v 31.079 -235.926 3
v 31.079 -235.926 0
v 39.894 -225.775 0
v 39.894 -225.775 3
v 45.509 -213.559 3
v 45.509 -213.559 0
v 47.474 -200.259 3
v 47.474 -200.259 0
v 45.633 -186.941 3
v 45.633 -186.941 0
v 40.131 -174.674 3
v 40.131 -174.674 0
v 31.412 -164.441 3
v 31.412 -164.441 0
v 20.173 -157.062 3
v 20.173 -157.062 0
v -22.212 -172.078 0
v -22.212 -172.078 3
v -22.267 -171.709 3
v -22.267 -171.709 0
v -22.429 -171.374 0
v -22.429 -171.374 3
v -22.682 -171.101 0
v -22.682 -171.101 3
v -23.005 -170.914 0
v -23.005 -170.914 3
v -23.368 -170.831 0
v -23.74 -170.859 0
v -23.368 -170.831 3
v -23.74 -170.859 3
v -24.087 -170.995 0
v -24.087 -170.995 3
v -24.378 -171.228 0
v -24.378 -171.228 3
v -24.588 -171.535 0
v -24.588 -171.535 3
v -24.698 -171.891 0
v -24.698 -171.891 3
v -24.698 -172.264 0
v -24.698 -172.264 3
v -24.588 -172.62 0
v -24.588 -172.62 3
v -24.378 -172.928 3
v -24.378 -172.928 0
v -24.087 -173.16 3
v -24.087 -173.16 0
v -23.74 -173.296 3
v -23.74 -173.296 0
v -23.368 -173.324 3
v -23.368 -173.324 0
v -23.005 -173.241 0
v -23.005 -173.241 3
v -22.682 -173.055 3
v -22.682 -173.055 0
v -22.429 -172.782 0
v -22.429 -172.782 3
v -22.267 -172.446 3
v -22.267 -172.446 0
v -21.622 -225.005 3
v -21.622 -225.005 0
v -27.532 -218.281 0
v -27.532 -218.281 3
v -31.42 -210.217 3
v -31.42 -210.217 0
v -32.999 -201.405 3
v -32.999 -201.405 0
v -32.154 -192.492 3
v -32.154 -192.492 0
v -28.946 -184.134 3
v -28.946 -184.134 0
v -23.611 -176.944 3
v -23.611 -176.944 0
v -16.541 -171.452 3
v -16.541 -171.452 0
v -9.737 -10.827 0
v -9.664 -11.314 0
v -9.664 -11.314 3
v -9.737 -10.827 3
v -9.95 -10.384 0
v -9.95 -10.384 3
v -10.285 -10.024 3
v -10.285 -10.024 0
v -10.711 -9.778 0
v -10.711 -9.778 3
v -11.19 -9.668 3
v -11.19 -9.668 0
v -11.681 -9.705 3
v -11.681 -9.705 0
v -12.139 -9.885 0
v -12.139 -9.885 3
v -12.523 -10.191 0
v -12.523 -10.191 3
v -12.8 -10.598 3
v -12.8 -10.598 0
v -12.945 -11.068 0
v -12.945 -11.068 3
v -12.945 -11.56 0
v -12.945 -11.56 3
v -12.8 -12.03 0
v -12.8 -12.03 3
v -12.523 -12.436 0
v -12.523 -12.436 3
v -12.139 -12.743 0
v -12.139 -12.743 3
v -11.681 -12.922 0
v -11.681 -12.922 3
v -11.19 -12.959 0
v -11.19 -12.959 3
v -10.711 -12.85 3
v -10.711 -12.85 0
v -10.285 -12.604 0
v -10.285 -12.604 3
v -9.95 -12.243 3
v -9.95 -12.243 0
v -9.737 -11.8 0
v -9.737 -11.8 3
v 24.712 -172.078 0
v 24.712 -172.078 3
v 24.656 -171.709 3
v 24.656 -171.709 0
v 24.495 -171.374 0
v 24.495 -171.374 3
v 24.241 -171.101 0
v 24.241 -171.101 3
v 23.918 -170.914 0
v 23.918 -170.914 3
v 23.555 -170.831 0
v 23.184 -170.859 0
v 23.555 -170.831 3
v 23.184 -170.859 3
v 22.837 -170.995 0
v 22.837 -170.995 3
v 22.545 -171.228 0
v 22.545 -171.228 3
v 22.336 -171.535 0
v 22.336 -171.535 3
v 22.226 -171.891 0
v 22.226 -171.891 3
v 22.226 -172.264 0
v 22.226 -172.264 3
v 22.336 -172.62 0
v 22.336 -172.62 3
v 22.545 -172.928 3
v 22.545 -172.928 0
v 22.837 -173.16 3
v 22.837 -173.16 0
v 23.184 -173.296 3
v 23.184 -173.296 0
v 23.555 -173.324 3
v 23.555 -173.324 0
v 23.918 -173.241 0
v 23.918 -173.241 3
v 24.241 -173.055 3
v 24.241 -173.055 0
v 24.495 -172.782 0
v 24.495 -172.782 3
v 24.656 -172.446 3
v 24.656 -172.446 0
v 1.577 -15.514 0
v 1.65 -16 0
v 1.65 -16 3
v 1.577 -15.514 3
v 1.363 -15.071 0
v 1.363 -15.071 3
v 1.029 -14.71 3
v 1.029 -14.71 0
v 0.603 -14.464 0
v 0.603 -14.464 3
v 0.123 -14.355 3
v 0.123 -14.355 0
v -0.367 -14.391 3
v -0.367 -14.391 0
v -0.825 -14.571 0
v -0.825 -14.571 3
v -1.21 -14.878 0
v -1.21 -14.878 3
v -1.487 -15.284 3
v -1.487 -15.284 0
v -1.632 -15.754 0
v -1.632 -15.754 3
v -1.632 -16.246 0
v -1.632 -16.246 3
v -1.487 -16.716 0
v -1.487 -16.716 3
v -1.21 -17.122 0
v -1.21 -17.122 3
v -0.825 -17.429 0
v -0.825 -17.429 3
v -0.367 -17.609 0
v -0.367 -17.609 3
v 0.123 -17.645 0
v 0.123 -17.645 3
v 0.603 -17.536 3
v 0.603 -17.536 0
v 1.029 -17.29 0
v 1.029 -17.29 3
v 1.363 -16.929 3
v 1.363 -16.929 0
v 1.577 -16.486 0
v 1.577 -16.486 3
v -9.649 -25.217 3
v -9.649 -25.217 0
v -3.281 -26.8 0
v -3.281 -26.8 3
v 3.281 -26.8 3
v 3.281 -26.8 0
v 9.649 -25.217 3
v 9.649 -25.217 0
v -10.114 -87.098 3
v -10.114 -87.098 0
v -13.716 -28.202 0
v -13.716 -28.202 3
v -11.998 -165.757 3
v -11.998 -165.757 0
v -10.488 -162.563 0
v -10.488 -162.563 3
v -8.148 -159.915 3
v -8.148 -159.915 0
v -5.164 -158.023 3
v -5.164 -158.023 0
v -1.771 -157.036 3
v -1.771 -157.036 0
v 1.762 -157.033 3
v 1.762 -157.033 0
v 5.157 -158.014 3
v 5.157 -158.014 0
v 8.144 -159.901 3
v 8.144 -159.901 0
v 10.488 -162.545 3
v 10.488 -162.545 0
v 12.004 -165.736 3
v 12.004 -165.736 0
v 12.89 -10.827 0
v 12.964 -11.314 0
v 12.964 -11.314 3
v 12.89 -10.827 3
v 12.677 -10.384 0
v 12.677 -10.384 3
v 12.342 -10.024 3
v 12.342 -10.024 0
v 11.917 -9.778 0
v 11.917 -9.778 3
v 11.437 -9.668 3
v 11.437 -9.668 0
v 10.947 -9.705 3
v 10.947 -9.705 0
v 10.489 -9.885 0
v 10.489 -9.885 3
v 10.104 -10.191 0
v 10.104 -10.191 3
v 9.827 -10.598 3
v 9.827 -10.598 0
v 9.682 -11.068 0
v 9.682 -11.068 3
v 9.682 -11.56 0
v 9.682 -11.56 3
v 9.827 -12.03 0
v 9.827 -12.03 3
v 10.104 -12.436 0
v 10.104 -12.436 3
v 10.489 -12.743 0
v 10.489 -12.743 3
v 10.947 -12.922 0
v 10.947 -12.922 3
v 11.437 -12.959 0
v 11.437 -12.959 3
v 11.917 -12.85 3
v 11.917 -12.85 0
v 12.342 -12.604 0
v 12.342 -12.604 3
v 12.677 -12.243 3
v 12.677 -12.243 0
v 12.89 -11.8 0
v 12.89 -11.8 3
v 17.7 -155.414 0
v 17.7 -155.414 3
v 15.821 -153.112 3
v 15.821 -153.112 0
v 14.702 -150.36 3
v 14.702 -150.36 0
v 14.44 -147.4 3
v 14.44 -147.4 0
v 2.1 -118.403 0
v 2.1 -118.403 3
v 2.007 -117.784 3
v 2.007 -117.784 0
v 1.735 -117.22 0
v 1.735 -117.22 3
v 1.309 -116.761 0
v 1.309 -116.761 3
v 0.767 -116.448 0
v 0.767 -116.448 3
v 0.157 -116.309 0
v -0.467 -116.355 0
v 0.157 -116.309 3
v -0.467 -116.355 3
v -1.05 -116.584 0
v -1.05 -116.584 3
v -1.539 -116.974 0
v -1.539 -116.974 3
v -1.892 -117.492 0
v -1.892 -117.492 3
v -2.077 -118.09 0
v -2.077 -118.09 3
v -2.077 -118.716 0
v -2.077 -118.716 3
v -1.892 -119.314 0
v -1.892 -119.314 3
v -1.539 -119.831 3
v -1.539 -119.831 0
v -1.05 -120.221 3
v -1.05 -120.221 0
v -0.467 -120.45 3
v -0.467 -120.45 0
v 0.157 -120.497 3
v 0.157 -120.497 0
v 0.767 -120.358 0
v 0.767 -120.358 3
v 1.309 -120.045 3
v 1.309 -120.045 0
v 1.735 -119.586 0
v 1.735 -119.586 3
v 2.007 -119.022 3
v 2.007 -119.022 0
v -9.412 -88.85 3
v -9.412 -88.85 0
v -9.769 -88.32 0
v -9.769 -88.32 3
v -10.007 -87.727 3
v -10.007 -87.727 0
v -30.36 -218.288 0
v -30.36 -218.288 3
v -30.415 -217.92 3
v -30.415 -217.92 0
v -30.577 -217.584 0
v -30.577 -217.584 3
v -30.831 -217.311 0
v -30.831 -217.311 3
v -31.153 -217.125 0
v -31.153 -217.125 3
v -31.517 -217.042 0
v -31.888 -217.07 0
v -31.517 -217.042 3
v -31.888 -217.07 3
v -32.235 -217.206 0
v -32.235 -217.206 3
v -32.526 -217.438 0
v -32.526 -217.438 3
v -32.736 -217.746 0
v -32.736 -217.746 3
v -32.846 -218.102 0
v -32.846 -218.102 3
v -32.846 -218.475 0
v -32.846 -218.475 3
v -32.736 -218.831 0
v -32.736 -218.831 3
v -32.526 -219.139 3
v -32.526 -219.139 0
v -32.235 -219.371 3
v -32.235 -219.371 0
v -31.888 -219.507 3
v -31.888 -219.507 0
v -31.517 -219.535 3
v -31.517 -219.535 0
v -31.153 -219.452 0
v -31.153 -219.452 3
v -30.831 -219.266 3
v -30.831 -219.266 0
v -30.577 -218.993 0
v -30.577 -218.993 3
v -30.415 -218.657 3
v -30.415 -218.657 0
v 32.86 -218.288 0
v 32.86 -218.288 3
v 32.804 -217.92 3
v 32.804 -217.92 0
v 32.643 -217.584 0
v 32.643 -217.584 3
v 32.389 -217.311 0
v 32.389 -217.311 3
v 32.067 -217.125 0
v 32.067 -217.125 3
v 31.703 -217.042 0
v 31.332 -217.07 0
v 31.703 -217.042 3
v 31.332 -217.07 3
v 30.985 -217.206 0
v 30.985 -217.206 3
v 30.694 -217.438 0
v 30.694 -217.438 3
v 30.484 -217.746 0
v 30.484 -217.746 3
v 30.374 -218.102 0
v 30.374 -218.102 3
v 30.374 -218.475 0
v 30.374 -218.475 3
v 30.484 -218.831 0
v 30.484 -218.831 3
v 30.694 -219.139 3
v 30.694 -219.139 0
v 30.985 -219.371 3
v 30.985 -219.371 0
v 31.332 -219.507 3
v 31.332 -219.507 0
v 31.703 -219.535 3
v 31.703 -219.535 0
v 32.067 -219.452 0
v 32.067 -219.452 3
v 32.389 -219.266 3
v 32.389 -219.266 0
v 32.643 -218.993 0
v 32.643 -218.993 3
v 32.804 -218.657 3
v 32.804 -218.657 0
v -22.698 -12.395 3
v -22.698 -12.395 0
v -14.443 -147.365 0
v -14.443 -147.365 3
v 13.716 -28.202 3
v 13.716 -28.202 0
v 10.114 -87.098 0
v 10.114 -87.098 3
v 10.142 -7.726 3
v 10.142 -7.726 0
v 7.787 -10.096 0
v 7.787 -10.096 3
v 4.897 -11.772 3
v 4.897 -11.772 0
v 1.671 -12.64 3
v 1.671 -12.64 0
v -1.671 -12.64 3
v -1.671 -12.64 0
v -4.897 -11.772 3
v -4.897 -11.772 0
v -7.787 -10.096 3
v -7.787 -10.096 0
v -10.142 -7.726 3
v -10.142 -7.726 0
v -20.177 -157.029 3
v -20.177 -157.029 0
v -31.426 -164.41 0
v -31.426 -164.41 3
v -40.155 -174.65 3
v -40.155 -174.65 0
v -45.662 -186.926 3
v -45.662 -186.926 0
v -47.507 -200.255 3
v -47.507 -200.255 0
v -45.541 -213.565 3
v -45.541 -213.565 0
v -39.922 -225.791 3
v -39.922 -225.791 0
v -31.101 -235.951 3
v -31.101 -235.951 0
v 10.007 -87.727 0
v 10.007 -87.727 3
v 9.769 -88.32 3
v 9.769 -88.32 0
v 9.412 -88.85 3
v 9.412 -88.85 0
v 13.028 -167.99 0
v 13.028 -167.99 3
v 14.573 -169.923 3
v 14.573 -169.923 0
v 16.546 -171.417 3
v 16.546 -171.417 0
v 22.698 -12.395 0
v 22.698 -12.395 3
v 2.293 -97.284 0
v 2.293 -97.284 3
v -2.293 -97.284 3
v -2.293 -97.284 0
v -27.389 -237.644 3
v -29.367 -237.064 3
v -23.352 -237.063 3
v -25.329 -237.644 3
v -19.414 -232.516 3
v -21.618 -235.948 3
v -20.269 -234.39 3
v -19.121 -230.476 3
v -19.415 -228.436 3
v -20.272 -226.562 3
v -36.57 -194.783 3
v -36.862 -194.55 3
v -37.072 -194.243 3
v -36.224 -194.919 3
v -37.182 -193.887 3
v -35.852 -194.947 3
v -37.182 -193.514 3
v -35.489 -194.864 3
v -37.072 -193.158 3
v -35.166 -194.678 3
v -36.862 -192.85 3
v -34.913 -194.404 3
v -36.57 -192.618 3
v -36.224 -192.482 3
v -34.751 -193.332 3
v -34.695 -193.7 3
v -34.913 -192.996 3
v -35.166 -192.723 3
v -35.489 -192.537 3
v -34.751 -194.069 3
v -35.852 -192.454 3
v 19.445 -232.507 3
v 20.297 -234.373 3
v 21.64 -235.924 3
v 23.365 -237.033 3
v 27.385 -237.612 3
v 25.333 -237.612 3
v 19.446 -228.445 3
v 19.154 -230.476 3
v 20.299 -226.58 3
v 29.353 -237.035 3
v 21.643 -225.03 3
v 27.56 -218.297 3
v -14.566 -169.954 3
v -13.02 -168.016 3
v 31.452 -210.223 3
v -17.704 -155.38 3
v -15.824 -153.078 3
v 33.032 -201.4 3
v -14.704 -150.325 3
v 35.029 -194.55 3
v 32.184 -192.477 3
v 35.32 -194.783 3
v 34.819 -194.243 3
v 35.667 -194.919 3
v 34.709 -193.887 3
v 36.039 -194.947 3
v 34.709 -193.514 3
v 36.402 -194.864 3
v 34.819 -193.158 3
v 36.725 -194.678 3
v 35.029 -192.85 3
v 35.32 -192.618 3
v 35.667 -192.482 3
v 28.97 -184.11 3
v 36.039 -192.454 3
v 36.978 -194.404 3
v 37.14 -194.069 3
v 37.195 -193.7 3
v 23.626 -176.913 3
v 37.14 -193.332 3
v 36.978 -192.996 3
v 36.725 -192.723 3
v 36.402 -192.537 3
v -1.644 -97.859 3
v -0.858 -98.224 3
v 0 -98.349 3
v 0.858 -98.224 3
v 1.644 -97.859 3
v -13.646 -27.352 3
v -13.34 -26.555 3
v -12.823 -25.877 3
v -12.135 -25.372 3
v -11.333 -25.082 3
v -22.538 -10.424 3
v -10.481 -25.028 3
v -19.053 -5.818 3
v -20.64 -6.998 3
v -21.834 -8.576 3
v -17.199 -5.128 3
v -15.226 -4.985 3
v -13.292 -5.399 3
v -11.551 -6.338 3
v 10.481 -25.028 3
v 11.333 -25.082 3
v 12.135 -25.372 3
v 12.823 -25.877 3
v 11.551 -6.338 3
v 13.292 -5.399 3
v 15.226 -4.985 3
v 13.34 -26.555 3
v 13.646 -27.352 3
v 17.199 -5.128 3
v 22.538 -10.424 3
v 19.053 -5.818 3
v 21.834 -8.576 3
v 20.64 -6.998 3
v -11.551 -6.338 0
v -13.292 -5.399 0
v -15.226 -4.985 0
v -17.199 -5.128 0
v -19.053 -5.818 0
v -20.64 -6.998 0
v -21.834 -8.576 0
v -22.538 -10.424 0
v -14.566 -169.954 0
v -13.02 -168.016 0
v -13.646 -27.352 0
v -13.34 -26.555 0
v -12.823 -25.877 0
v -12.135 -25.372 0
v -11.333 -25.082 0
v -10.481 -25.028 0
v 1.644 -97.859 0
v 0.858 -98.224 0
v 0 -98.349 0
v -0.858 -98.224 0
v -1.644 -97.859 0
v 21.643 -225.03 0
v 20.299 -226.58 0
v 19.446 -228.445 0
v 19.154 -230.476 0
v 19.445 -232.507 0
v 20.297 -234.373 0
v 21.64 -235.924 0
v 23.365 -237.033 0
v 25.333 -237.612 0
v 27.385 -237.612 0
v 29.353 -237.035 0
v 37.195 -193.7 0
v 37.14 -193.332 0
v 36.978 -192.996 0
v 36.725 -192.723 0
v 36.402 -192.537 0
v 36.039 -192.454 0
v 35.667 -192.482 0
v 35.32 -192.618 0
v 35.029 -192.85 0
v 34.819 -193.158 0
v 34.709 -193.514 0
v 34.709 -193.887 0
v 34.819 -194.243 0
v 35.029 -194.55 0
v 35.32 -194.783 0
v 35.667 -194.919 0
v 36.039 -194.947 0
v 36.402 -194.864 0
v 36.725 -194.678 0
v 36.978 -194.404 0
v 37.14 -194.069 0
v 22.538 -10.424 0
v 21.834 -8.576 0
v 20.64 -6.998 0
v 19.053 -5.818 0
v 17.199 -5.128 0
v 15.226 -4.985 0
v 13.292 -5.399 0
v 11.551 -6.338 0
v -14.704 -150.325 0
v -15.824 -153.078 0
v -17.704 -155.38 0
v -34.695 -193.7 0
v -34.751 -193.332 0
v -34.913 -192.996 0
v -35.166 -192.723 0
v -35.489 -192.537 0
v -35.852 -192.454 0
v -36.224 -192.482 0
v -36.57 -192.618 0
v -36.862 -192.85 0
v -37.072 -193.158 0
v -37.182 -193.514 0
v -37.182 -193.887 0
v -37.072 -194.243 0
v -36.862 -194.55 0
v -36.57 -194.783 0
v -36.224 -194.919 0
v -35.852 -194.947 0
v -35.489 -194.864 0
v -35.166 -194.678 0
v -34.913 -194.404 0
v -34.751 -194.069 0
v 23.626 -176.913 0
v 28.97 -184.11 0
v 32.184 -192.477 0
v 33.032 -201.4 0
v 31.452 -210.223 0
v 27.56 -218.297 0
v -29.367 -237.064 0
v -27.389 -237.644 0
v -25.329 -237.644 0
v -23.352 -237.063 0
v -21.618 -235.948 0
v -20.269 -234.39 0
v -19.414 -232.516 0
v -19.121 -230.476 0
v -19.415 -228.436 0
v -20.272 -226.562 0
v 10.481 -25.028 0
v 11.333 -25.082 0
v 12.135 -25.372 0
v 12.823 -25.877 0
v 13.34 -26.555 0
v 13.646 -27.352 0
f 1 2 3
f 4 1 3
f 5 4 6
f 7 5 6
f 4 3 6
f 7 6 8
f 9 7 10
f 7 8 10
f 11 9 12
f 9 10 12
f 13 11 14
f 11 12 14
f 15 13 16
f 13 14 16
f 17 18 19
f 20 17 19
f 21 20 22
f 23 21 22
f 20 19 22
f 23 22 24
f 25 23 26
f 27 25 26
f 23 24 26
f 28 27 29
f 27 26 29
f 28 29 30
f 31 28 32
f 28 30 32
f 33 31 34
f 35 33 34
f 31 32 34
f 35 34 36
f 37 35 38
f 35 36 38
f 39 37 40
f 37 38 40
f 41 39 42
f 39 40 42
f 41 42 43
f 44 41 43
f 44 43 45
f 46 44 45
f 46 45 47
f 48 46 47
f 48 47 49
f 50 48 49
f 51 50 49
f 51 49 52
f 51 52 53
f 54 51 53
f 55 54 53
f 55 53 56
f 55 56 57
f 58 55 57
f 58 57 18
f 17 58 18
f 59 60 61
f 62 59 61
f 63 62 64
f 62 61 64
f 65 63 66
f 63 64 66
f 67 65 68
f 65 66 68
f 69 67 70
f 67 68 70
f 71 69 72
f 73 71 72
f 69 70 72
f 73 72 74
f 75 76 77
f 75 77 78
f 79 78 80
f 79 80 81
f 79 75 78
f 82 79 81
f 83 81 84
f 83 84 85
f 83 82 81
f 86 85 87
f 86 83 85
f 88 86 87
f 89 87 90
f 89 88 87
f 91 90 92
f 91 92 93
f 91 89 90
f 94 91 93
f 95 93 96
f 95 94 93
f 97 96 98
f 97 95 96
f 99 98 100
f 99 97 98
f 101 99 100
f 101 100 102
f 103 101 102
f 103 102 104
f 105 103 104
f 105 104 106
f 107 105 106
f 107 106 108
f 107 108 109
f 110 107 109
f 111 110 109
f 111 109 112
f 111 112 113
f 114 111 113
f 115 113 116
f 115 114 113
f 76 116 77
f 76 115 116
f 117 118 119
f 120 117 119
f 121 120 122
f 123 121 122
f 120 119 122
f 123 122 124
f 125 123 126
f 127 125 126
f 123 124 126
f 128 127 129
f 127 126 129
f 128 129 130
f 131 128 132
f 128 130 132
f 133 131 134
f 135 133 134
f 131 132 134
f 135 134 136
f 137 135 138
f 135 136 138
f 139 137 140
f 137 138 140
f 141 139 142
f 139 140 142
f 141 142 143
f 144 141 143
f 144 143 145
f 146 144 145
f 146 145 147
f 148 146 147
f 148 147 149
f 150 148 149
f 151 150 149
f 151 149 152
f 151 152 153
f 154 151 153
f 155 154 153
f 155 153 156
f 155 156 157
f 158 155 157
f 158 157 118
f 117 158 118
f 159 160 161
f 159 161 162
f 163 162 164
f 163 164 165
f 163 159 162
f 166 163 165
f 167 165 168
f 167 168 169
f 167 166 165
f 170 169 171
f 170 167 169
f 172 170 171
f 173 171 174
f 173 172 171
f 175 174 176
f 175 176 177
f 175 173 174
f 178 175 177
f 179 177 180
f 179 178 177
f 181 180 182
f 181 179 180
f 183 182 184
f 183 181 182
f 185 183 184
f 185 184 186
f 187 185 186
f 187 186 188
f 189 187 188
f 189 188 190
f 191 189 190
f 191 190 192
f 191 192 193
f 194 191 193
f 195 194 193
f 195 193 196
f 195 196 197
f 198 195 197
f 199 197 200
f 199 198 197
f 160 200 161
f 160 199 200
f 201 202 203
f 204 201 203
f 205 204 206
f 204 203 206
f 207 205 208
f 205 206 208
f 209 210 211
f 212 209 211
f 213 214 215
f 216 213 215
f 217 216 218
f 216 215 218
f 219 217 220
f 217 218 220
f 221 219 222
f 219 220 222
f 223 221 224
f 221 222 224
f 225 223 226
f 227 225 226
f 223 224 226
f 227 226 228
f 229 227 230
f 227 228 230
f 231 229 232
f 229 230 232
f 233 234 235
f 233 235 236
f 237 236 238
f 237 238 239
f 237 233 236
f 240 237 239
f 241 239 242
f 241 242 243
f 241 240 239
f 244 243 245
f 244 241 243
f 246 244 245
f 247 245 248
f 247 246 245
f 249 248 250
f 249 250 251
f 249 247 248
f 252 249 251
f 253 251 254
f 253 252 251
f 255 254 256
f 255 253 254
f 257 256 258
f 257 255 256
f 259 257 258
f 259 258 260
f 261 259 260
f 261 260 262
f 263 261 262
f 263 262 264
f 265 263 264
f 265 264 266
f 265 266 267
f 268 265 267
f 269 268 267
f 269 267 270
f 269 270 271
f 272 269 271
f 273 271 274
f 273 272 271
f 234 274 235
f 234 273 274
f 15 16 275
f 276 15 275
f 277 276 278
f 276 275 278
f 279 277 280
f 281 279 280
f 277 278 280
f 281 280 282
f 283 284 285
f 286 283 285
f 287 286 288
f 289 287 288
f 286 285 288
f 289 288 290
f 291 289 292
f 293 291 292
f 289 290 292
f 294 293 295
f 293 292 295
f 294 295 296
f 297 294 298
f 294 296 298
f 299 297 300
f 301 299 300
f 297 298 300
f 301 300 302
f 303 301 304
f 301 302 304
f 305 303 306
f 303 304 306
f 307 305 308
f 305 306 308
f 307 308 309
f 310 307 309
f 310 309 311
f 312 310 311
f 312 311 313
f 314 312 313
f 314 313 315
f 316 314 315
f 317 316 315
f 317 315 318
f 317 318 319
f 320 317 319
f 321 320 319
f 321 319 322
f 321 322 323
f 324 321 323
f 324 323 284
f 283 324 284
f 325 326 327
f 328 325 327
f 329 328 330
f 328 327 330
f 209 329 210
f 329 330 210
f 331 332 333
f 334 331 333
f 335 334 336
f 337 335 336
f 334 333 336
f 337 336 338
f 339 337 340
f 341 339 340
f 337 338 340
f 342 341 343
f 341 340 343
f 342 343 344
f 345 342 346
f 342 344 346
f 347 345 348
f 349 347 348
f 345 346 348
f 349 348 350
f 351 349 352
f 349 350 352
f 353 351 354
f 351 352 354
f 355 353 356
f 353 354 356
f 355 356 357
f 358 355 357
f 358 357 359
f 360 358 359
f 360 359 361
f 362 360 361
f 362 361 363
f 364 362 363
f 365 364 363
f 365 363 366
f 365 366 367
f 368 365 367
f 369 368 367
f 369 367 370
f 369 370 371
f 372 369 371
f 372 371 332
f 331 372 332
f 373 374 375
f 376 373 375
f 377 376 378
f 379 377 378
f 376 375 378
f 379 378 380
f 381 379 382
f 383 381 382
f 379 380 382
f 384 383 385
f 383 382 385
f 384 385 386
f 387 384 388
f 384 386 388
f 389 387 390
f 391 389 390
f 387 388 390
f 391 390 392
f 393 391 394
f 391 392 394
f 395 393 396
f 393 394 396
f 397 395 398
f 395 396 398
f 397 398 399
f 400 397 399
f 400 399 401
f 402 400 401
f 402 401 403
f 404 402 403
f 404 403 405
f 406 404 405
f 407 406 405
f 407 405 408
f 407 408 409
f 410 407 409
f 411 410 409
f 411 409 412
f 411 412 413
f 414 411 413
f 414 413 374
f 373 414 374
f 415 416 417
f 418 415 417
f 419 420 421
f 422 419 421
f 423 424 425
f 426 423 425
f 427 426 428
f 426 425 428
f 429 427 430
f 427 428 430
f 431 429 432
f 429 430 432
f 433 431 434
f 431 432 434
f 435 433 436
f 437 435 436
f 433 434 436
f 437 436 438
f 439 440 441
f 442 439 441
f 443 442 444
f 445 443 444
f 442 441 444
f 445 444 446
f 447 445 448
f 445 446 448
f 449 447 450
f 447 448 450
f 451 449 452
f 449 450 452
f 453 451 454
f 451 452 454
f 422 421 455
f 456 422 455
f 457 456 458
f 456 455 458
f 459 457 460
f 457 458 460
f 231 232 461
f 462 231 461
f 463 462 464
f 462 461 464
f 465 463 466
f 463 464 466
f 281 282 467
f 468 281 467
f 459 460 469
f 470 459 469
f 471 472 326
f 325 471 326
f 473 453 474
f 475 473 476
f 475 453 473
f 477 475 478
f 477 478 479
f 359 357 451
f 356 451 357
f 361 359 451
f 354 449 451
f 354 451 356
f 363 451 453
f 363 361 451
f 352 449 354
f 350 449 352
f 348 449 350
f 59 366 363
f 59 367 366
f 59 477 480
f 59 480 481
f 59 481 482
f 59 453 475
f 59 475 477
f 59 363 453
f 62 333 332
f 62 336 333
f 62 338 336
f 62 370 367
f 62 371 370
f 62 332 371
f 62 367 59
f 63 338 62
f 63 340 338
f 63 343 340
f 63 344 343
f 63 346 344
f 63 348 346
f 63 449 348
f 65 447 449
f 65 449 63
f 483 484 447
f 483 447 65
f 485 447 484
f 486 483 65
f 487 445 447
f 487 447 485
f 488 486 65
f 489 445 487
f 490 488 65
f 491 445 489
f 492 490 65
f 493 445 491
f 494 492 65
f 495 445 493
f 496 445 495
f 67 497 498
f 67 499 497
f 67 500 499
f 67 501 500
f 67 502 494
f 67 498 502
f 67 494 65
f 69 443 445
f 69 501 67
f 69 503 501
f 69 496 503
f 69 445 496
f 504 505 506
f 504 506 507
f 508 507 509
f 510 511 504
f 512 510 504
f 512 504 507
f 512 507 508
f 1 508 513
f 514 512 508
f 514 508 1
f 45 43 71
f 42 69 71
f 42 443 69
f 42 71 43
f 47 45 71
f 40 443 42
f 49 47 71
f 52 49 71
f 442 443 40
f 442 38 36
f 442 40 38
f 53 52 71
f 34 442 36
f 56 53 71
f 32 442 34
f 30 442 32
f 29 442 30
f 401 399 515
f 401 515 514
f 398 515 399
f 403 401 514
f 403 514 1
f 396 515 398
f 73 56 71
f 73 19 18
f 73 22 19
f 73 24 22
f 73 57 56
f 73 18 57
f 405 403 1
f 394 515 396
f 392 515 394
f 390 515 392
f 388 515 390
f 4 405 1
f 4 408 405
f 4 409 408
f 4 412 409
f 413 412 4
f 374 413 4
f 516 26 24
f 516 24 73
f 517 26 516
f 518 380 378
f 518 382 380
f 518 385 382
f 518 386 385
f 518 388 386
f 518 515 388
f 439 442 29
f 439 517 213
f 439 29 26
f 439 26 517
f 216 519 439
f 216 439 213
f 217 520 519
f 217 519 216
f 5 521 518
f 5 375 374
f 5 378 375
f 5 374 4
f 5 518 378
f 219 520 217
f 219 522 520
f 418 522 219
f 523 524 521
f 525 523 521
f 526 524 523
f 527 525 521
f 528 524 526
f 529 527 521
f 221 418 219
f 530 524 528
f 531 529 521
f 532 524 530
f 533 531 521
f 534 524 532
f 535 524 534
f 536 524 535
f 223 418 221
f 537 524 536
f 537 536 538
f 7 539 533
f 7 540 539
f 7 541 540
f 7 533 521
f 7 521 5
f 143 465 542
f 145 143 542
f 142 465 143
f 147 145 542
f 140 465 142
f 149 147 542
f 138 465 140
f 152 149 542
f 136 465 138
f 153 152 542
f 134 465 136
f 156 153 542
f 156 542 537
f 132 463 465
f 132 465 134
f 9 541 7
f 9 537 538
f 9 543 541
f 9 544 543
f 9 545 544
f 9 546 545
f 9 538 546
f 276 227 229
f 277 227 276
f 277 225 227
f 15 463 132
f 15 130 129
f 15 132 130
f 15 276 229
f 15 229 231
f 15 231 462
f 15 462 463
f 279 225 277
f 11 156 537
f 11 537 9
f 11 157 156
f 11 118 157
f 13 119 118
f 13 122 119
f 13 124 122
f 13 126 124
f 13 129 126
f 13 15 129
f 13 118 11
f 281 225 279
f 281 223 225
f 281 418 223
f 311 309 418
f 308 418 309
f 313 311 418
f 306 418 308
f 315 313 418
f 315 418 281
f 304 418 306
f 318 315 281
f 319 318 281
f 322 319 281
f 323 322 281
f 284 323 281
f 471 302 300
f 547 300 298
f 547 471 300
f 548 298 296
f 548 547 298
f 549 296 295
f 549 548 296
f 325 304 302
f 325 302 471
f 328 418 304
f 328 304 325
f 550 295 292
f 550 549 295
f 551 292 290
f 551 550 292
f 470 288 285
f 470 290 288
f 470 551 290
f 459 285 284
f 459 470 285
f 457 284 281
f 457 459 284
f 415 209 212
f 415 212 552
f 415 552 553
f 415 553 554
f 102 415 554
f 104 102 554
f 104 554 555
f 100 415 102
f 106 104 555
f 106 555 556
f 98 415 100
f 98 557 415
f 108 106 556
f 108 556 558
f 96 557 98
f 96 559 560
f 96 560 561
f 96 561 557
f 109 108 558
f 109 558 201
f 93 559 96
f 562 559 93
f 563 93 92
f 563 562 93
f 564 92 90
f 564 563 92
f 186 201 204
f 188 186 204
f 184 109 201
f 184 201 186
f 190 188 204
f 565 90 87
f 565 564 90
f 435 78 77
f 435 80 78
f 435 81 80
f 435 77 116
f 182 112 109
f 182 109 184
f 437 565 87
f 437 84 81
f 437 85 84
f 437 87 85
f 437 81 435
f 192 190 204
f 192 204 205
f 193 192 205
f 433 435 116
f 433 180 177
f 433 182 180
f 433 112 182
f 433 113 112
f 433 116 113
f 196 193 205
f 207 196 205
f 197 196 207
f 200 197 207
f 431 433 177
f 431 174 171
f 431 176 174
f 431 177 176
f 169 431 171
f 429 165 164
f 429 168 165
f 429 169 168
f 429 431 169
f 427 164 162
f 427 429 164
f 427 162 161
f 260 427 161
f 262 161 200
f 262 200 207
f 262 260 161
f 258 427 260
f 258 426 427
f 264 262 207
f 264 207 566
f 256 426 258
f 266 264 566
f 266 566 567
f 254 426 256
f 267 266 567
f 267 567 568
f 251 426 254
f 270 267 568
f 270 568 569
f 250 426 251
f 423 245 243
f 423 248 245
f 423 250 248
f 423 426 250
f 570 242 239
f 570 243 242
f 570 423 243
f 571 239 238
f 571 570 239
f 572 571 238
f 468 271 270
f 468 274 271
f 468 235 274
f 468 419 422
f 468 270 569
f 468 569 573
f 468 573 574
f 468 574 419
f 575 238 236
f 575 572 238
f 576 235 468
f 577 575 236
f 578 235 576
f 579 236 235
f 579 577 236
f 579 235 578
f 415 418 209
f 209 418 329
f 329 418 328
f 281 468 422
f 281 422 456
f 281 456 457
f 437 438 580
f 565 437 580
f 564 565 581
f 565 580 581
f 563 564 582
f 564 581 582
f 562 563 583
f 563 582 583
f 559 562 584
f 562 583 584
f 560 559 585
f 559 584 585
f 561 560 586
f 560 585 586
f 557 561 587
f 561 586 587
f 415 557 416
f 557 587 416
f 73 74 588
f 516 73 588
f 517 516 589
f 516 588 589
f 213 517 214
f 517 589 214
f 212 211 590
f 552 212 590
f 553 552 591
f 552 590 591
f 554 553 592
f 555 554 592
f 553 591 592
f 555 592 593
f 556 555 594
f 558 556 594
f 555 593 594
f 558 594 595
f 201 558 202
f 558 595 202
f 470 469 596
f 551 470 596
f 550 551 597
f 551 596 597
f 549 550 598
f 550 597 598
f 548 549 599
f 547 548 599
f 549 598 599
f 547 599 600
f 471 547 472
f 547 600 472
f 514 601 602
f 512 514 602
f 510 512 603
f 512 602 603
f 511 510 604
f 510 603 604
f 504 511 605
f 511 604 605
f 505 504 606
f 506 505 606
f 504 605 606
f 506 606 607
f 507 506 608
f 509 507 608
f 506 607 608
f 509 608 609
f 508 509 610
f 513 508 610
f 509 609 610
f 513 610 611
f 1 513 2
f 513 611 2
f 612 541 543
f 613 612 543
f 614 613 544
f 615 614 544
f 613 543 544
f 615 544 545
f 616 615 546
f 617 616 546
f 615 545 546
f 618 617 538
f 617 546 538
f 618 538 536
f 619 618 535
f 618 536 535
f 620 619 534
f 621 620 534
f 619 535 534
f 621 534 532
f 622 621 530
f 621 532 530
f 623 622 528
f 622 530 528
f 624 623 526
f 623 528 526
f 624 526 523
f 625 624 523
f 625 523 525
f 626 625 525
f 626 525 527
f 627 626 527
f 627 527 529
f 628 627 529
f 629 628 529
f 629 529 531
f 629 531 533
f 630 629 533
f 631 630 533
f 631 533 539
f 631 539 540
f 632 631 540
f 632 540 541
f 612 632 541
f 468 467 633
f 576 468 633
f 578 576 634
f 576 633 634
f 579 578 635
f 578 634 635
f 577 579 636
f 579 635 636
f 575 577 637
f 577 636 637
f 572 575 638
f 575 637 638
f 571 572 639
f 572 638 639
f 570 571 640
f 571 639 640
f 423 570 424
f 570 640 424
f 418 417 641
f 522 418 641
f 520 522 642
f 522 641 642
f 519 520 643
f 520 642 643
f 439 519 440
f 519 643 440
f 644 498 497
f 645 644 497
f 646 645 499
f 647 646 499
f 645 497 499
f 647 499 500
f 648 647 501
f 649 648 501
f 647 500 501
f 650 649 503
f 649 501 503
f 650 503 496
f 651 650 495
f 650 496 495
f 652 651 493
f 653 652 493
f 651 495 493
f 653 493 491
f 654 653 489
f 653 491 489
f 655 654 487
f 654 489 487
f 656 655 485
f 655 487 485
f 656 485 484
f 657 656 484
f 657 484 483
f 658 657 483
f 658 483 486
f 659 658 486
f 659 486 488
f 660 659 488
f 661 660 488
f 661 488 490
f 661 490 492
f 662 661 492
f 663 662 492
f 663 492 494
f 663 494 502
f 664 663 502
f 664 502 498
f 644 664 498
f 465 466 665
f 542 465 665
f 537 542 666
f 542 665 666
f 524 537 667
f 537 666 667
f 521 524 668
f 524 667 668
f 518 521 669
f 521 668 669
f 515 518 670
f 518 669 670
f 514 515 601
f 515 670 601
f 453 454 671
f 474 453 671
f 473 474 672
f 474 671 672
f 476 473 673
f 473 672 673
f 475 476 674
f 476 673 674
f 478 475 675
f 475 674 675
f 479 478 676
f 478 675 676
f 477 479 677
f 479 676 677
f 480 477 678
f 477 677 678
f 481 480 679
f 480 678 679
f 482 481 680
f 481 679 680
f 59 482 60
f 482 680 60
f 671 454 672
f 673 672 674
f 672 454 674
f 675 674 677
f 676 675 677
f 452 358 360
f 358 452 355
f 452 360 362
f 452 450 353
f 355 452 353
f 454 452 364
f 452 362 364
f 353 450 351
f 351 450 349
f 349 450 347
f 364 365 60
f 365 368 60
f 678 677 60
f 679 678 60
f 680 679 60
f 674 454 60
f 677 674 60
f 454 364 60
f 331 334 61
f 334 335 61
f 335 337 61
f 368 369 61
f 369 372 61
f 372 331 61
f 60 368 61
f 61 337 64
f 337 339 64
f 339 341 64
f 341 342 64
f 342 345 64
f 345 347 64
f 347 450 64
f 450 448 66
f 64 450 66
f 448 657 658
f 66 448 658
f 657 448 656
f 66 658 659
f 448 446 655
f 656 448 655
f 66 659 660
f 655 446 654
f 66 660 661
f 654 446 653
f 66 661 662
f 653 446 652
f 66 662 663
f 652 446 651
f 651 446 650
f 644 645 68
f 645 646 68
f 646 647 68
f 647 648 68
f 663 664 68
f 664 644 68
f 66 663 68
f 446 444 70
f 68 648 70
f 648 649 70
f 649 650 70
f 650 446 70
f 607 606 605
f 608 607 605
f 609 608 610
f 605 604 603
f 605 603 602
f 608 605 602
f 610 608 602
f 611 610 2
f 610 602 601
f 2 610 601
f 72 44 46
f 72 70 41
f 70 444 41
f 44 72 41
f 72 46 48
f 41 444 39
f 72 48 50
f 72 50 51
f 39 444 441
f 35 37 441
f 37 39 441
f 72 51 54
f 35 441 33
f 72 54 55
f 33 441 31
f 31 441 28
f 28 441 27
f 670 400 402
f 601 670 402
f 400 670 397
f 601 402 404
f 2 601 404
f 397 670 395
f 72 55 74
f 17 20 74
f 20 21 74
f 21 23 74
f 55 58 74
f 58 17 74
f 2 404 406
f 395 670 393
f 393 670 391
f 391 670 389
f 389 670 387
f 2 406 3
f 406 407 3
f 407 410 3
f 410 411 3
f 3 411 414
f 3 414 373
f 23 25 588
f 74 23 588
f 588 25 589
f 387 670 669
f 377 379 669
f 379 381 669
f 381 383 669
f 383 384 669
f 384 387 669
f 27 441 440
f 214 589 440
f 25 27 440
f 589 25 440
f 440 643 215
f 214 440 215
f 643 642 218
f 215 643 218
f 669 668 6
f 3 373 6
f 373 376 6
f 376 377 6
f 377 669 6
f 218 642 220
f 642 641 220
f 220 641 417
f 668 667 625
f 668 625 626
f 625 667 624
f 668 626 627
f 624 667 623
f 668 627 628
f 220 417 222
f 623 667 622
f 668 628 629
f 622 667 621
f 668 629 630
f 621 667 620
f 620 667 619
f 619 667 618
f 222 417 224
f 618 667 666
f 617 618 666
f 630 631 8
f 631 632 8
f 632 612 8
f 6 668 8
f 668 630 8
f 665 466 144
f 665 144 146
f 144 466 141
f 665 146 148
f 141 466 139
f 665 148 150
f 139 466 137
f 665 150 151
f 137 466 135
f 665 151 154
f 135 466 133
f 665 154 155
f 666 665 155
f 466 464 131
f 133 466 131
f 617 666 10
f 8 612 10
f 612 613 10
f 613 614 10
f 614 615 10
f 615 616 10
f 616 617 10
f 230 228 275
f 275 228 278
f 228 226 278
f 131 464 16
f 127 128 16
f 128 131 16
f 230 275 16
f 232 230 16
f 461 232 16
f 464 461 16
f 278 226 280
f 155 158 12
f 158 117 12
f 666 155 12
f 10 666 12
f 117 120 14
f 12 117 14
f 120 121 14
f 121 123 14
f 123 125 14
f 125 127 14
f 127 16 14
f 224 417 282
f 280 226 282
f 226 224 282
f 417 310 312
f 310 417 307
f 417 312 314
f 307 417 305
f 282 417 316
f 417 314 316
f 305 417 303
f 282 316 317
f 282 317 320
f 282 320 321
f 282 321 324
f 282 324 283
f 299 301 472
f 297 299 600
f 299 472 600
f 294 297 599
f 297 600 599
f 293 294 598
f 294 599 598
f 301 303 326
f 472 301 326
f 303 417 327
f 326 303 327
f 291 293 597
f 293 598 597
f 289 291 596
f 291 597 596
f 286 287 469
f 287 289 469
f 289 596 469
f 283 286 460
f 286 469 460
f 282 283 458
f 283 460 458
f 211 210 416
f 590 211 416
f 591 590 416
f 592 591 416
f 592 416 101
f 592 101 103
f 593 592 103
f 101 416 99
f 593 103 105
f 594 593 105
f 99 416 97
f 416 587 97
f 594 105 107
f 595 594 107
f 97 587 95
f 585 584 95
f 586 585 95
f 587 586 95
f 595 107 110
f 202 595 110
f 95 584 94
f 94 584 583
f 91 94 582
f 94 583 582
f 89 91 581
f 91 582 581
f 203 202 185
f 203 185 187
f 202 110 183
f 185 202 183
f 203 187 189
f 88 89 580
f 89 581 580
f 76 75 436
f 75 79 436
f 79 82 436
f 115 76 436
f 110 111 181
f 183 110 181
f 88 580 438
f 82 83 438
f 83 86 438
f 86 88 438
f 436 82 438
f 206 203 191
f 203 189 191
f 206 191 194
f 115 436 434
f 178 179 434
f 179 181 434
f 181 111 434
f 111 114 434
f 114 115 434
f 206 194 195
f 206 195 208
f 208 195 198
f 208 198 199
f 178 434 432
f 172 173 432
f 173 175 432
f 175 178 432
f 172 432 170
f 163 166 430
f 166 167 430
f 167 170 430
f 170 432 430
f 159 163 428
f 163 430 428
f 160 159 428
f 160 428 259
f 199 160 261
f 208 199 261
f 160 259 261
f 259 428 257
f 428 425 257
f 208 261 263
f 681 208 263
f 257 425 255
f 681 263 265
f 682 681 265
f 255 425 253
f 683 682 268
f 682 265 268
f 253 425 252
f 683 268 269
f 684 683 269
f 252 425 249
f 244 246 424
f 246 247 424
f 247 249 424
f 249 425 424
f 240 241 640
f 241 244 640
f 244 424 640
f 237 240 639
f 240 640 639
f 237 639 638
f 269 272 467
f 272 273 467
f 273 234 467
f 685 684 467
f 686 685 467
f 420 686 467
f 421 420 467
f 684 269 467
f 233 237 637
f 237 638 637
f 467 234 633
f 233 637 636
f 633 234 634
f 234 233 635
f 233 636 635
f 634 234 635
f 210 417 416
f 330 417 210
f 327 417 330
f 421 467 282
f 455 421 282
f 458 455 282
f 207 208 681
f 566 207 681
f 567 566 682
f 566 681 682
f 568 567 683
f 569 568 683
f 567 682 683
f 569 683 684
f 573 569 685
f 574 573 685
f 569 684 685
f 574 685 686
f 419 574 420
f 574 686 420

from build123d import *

# Parameters (mm, degrees)
SKETCH_1_R          = 1.65
EXTRUDE_1_DEPTH     = 3
CUT_EXTRUDE_2_DEPTH = 15
SKETCH_5_R          = 2.1
CUT_EXTRUDE_4_DEPTH = 10
SKETCH_7_R          = 1.25
CUT_EXTRUDE_5_DEPTH = 10


with BuildPart() as part:
    # 草图1 → 凸台-拉伸1 (new body)
    with BuildSketch(Plane.XY):
        with BuildLine():
            Line((-22.697635701, -12.395491404), (-14.442560568, -147.364776776))
            ThreePointArc((-14.442560568, -147.364776776), (-15.823949319, -153.078271204), (-20.176817783, -157.028561017))
            ThreePointArc((-20.176817783, -157.028561017), (-47.058743214, -193.524865403), (-31.100695855, -235.950787588))
            ThreePointArc((-31.100695855, -235.950787588), (-20.888265121, -235.217514211), (-21.621538498, -225.005083476))
            ThreePointArc((-21.621538498, -225.005083476), (-32.880043508, -196.919424149), (-16.54147024, -171.451616657))
            ThreePointArc((-16.54147024, -171.451616657), (-13.7328083, -169.032706132), (-11.998184018, -165.756917888))
            ThreePointArc((-11.998184018, -165.756917888), (-0.004609984, -156.91008357), (12.004108348, -165.736350029))
            ThreePointArc((12.004108348, -165.736350029), (13.740280131, -169.004081067), (16.545879515, -171.416749859))
            ThreePointArc((16.545879515, -171.416749859), (32.911643519, -196.909572863), (21.642742476, -225.029567981))
            ThreePointArc((21.642742476, -225.029567981), (20.912749625, -235.196310232), (31.079491877, -235.926303083))
            ThreePointArc((31.079491877, -235.926303083), (47.027386385, -193.534561527), (20.172667208, -157.062392008))
            ThreePointArc((20.172667208, -157.062392008), (15.821251847, -153.112090569), (14.440433304, -147.39955722))
            Line((14.440433304, -147.39955722), (22.697635701, -12.395491404))
            ThreePointArc((22.697635701, -12.395491404), (18.150671537, -5.407168438), (10.142345541, -7.726275101))
            ThreePointArc((10.142345541, -7.726275101), (0, -12.75), (-10.142345541, -7.726275101))
            ThreePointArc((-10.142345541, -7.726275101), (-18.150671537, -5.407168438), (-22.697635701, -12.395491404))
        make_face()
        with Locations((-11.313708499, -11.313708499)):
            Circle(SKETCH_1_R, mode=Mode.SUBTRACT)
        with Locations((0, -16)):
            Circle(SKETCH_1_R, mode=Mode.SUBTRACT)
        with Locations((11.313708499, -11.313708499)):
            Circle(SKETCH_1_R, mode=Mode.SUBTRACT)
    extrude(amount=EXTRUDE_1_DEPTH)

    # 草图4 → 切除-拉伸2 (cut)
    with BuildSketch(Plane(origin=(0, 0, 0), x_dir=(-1, 0, 0), z_dir=(0, 0, -1))):
        with BuildLine():
            Line((-13.715926625, -28.201870805), (-10.113702702, -87.097711346))
            ThreePointArc((-10.113702702, -87.097711346), (-9.904103863, -88.030297779), (-9.411801117, -88.849618921))
            Line((-9.411801117, -88.849618921), (-2.292502811, -97.284018261))
            ThreePointArc((-2.292502811, -97.284018261), (0, -98.348965067), (2.292502811, -97.284018261))
            Line((2.292502811, -97.284018261), (9.411801117, -88.849618921))
            ThreePointArc((9.411801117, -88.849618921), (9.904103863, -88.030297779), (10.113702702, -87.097711346))
            Line((10.113702702, -87.097711346), (13.715926625, -28.201870805))
            ThreePointArc((13.715926625, -28.201870805), (12.496725506, -25.600326268), (9.649370007, -25.216852668))
            ThreePointArc((9.649370007, -25.216852668), (0, -27), (-9.649370007, -25.216852668))
            ThreePointArc((-9.649370007, -25.216852668), (-12.496725506, -25.600326268), (-13.715926625, -28.201870805))
        make_face()
    extrude(amount=-CUT_EXTRUDE_2_DEPTH, mode=Mode.SUBTRACT)

    # 草图5 → 切除-拉伸4 (cut)
    with BuildSketch(Plane.XY.offset(3)):
        with Locations((0, -188.402692504)):
            Circle(SKETCH_5_R)
        with Locations((0, -118.402692504)):
            Circle(SKETCH_5_R)
    extrude(amount=-CUT_EXTRUDE_4_DEPTH, mode=Mode.SUBTRACT)

    # 草图7 → 切除-拉伸5 (cut)
    with BuildSketch(Plane.XY.offset(3)):
        with Locations((0, -163.538416724)):
            Circle(SKETCH_7_R)
        with Locations((23.461747754, -172.07779455)):
            Circle(SKETCH_7_R)
        with Locations((35.945482985, -193.700258239)):
            Circle(SKETCH_7_R)
        with Locations((31.609927238, -218.288416724)):
            Circle(SKETCH_7_R)
        with Locations((12.483735231, -234.337197383)):
            Circle(SKETCH_7_R)
        with Locations((-12.483735231, -234.337197383)):
            Circle(SKETCH_7_R)
        with Locations((-31.609927238, -218.288416724)):
            Circle(SKETCH_7_R)
        with Locations((-35.945482985, -193.700258239)):
            Circle(SKETCH_7_R)
        with Locations((-23.461747754, -172.07779455)):
            Circle(SKETCH_7_R)
    extrude(amount=-CUT_EXTRUDE_5_DEPTH, mode=Mode.SUBTRACT)


solid = part.part
